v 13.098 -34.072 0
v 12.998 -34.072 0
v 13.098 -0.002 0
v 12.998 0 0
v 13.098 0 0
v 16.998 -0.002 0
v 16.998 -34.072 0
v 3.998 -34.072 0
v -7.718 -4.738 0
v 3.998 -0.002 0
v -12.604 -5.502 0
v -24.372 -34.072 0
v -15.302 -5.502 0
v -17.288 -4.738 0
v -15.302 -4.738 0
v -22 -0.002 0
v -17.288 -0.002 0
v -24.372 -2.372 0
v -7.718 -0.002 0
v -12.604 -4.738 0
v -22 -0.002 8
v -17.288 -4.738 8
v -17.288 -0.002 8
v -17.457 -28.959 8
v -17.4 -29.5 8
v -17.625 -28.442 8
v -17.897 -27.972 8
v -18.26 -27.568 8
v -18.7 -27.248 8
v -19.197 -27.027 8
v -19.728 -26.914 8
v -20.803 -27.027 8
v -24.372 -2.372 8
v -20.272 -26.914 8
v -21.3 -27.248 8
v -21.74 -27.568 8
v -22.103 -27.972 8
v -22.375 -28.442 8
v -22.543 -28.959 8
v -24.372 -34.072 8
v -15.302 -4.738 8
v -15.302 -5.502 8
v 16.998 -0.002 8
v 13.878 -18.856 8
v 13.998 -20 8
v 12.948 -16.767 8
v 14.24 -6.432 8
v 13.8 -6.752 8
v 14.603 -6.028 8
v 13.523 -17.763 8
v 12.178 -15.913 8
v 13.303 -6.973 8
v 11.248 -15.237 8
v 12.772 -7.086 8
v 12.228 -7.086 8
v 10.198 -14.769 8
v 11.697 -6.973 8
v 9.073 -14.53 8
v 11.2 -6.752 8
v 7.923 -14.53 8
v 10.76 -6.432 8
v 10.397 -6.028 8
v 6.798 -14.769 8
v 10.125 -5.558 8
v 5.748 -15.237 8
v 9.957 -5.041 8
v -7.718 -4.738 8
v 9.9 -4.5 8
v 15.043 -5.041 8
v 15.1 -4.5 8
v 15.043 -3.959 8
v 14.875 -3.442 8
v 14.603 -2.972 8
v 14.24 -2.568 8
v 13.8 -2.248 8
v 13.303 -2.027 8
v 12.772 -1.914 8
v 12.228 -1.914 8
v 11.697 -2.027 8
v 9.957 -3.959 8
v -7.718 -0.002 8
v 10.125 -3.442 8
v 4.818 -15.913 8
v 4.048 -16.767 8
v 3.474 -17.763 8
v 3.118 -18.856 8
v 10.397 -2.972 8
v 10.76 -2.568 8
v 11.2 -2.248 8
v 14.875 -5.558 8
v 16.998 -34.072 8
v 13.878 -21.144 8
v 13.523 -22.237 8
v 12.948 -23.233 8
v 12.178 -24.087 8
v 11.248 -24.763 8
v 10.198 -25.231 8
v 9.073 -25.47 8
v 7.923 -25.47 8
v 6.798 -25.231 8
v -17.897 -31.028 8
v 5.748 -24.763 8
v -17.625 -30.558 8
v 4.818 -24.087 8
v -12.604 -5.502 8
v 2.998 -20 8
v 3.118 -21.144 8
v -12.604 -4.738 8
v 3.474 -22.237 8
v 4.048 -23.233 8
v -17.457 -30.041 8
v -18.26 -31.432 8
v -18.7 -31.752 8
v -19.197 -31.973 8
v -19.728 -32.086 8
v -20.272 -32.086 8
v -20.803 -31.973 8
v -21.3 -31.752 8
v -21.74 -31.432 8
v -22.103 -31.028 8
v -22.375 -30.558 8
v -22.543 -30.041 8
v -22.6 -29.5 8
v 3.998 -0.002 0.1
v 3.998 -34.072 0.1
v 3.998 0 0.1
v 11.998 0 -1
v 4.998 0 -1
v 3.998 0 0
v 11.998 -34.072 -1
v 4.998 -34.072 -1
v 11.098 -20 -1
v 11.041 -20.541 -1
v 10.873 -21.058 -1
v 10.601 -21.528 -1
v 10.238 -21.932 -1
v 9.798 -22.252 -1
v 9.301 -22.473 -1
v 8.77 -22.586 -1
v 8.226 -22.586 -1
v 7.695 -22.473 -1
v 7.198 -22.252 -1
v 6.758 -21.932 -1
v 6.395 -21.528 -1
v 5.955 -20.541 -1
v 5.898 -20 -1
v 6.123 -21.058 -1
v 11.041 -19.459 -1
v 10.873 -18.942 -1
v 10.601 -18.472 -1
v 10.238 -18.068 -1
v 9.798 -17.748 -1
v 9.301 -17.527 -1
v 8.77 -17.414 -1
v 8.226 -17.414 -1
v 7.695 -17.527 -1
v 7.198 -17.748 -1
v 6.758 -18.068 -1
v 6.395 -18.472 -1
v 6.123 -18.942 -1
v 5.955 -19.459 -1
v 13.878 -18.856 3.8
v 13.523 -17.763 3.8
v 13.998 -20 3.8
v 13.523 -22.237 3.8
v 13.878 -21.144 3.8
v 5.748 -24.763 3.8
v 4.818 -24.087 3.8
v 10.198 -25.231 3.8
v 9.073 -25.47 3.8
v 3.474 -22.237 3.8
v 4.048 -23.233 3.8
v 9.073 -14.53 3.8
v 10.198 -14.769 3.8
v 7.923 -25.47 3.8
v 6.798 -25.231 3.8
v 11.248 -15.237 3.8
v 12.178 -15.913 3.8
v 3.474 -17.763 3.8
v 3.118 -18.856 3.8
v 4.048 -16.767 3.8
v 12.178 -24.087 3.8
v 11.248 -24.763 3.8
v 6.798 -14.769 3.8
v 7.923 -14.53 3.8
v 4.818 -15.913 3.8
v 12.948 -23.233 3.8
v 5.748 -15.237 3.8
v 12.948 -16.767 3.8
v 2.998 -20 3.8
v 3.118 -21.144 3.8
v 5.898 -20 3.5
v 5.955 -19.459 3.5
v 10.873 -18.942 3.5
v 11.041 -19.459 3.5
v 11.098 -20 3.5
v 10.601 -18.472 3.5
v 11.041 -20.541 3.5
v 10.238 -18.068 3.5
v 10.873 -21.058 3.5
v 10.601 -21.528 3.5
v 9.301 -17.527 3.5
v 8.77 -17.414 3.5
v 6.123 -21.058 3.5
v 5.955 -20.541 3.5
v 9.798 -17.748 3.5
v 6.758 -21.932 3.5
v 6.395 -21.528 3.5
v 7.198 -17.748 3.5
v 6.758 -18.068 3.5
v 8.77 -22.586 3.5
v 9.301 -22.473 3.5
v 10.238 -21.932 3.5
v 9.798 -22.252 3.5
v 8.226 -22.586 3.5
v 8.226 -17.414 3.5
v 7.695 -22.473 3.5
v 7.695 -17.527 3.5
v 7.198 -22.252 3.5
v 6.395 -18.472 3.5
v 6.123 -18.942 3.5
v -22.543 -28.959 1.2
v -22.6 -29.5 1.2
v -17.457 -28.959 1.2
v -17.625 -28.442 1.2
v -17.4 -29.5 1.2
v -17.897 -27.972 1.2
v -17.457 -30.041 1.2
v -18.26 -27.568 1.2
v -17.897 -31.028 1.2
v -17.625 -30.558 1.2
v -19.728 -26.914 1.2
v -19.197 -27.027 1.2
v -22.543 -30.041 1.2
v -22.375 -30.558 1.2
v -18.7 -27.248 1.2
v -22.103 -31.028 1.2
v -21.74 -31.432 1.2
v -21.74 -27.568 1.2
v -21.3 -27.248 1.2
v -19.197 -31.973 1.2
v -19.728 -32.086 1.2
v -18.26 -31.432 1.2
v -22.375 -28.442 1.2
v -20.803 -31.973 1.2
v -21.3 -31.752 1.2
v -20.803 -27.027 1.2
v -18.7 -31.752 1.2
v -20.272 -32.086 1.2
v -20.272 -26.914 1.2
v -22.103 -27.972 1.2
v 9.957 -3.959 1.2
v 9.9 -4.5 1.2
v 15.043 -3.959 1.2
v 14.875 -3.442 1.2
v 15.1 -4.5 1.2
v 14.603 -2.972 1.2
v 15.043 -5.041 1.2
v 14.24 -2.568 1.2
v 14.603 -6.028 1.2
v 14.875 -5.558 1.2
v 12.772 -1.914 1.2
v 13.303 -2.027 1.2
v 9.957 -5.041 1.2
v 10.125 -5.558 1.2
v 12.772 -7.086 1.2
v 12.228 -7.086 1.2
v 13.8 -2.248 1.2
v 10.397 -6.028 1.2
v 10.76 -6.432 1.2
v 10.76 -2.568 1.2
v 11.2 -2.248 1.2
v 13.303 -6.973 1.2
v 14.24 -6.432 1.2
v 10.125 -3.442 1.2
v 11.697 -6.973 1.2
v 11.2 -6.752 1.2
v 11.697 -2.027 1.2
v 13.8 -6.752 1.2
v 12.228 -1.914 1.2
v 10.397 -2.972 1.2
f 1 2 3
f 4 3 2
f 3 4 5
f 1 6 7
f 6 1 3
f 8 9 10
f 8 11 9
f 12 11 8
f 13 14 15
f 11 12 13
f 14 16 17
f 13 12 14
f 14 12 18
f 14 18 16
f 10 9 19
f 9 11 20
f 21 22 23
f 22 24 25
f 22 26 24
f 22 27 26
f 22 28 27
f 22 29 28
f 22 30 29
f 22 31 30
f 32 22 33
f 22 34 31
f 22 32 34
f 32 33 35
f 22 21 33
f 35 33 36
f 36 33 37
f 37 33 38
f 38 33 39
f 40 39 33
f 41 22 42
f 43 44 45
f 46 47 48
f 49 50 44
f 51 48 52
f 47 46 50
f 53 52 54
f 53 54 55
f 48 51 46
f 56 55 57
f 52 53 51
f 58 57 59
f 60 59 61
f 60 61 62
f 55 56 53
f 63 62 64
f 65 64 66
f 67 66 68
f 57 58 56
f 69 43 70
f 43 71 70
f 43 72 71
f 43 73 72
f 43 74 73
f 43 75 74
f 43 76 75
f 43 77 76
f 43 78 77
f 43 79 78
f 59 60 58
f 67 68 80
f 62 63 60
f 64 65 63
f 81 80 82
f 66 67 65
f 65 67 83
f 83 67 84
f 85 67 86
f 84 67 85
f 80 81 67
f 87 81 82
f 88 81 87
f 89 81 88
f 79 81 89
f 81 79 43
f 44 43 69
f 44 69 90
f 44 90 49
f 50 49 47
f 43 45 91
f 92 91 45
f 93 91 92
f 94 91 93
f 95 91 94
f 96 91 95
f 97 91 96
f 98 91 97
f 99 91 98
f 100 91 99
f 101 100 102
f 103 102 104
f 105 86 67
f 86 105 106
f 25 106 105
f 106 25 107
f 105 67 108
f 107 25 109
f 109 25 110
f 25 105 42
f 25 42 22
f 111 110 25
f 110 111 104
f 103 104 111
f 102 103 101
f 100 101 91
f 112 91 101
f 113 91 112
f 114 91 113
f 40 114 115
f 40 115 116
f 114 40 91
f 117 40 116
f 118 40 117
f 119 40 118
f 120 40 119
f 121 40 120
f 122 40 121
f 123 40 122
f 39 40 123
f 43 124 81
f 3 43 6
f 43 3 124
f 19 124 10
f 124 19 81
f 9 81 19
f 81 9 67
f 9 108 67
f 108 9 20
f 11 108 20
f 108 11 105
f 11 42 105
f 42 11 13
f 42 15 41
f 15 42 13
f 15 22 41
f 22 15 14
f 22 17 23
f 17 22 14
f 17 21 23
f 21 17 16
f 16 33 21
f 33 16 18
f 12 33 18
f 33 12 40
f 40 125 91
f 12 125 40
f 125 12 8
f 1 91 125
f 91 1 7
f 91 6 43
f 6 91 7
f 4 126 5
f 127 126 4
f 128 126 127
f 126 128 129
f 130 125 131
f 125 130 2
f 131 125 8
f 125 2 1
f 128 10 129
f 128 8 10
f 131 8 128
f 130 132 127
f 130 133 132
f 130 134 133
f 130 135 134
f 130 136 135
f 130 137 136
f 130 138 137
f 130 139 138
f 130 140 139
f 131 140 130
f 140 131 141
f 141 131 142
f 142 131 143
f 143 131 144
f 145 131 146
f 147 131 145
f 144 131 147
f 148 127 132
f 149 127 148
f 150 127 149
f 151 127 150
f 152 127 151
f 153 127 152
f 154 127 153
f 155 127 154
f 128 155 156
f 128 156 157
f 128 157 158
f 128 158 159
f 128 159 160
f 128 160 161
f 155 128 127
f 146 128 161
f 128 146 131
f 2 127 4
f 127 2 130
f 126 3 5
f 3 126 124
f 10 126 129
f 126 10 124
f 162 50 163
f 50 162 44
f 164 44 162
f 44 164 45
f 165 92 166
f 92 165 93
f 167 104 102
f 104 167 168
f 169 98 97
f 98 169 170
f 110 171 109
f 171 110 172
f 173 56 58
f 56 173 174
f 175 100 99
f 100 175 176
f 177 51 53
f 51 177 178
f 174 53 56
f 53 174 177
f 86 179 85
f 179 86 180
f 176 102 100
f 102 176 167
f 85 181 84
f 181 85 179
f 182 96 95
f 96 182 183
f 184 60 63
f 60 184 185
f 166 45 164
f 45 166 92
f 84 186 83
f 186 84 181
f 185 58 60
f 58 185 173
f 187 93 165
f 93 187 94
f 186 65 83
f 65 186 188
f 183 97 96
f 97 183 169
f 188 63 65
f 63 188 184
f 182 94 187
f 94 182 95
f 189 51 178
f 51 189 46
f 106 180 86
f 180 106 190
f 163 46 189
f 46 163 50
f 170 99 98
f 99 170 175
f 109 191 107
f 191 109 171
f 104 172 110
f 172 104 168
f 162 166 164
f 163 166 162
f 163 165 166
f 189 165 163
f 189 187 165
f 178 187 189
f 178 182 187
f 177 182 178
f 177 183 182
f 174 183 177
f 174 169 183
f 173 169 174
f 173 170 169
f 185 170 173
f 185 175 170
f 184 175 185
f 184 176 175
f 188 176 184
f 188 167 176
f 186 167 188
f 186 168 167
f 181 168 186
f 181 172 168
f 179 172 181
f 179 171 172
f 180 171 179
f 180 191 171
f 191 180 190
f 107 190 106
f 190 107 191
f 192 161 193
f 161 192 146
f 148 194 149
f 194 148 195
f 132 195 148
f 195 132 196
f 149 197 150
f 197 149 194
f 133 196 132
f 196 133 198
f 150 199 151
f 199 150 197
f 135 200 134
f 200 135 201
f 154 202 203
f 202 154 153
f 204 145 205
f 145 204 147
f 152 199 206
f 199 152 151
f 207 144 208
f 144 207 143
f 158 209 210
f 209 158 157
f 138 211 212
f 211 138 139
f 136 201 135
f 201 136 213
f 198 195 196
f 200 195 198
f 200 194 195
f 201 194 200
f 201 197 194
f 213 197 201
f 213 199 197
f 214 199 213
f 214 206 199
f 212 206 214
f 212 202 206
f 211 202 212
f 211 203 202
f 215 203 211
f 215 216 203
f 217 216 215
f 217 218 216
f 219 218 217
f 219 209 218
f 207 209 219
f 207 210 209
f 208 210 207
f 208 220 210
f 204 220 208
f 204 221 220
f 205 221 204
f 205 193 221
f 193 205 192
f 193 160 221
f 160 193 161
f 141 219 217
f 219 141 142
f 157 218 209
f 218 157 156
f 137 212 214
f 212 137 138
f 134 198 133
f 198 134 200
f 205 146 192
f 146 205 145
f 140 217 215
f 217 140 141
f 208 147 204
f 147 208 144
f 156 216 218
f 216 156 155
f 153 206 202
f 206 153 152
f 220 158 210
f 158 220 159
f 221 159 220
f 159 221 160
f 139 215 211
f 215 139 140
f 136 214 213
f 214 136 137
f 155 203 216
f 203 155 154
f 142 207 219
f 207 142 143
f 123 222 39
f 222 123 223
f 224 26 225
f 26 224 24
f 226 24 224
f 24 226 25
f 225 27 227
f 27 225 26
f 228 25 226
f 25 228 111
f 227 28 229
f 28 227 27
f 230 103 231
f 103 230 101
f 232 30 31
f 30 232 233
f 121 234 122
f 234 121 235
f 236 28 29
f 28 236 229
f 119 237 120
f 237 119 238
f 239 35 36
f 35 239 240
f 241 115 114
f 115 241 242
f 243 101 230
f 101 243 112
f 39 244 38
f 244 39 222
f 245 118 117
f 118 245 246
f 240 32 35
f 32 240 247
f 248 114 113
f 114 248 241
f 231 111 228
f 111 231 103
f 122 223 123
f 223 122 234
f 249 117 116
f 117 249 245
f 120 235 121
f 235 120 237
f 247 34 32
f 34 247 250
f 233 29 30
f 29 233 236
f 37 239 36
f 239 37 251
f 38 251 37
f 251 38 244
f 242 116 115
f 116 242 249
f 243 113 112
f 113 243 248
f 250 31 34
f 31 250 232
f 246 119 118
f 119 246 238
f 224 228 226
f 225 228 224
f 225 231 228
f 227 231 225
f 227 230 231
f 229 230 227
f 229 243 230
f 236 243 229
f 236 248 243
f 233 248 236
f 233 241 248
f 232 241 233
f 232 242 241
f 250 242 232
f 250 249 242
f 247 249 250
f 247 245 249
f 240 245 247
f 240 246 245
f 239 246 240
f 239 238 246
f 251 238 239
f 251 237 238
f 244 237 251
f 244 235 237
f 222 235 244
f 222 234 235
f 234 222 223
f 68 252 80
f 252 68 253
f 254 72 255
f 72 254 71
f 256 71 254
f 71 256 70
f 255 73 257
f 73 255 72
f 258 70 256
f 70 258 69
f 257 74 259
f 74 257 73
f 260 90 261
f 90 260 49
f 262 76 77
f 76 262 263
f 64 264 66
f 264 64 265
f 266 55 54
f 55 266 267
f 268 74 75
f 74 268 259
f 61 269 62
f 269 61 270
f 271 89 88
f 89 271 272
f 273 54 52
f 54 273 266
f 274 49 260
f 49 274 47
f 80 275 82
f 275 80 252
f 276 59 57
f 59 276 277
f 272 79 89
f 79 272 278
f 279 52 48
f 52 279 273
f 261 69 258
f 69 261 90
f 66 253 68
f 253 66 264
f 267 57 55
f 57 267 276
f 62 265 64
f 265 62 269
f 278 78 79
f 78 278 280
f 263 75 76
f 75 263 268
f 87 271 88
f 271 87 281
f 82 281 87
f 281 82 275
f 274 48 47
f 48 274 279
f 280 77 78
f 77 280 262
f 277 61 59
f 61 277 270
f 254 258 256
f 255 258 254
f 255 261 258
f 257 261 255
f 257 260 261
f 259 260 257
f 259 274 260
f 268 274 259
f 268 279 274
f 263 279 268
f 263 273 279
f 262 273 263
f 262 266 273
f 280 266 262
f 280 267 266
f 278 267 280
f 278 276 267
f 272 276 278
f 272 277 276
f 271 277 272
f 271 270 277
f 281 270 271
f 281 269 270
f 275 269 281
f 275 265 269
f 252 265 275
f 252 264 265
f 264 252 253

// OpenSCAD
$fn=30;

thick=8;

/* main body */
difference() {
   union() {
      linear_extrude(height=thick)
         polygon(points=[[16.998,-0.002], [-7.718,-0.002], [-7.718, -4.738],
                         [-12.604,-4.738], [-12.604,-5.502], [-15.302,-5.502],
                         [-15.302,-4.738], [-17.288,-4.738], [-17.288,-0.002],
                         [-22,-0.002], [-24.372,-2.372], [-24.372,-34.072],
                         [16.998,-34.072]]);
   
      /* angled bit to fit in v-slot */
      translate([16.998-4,0,0]) rotate([-90,0,180])
         linear_extrude(height=34.072)
            polygon(points=[[-0.1,0],[0,0],[1,1],[8,1],[9,0],[9,-0.1]]);
   }
   
   /* round head M5 hole */
   translate([16.998-8.5,-20,0]) {
      translate([0,0,3.8]) cylinder(d=11,h=10);
      translate([0,0,-2]) cylinder(d=5.2,h=3.5+2);
   }

   screwHoles();
}
   // screwHoles();

module screwHoles() {
   translate([-20.0,-29.5,0]) {
      translate([0,0,thick-6.9+0.1]) cylinder(d=5.2,h=6.9);
      translate([0,0,thick+0.1]) cylinder(d=3.2,h=30);
   }
   translate([12.5,-4.5,0]) {
      translate([0,0,thick-6.9+0.1]) cylinder(d=5.2,h=6.9);
      translate([0,0,thick+0.1]) cylinder(d=3.2,h=30);
   }
}
